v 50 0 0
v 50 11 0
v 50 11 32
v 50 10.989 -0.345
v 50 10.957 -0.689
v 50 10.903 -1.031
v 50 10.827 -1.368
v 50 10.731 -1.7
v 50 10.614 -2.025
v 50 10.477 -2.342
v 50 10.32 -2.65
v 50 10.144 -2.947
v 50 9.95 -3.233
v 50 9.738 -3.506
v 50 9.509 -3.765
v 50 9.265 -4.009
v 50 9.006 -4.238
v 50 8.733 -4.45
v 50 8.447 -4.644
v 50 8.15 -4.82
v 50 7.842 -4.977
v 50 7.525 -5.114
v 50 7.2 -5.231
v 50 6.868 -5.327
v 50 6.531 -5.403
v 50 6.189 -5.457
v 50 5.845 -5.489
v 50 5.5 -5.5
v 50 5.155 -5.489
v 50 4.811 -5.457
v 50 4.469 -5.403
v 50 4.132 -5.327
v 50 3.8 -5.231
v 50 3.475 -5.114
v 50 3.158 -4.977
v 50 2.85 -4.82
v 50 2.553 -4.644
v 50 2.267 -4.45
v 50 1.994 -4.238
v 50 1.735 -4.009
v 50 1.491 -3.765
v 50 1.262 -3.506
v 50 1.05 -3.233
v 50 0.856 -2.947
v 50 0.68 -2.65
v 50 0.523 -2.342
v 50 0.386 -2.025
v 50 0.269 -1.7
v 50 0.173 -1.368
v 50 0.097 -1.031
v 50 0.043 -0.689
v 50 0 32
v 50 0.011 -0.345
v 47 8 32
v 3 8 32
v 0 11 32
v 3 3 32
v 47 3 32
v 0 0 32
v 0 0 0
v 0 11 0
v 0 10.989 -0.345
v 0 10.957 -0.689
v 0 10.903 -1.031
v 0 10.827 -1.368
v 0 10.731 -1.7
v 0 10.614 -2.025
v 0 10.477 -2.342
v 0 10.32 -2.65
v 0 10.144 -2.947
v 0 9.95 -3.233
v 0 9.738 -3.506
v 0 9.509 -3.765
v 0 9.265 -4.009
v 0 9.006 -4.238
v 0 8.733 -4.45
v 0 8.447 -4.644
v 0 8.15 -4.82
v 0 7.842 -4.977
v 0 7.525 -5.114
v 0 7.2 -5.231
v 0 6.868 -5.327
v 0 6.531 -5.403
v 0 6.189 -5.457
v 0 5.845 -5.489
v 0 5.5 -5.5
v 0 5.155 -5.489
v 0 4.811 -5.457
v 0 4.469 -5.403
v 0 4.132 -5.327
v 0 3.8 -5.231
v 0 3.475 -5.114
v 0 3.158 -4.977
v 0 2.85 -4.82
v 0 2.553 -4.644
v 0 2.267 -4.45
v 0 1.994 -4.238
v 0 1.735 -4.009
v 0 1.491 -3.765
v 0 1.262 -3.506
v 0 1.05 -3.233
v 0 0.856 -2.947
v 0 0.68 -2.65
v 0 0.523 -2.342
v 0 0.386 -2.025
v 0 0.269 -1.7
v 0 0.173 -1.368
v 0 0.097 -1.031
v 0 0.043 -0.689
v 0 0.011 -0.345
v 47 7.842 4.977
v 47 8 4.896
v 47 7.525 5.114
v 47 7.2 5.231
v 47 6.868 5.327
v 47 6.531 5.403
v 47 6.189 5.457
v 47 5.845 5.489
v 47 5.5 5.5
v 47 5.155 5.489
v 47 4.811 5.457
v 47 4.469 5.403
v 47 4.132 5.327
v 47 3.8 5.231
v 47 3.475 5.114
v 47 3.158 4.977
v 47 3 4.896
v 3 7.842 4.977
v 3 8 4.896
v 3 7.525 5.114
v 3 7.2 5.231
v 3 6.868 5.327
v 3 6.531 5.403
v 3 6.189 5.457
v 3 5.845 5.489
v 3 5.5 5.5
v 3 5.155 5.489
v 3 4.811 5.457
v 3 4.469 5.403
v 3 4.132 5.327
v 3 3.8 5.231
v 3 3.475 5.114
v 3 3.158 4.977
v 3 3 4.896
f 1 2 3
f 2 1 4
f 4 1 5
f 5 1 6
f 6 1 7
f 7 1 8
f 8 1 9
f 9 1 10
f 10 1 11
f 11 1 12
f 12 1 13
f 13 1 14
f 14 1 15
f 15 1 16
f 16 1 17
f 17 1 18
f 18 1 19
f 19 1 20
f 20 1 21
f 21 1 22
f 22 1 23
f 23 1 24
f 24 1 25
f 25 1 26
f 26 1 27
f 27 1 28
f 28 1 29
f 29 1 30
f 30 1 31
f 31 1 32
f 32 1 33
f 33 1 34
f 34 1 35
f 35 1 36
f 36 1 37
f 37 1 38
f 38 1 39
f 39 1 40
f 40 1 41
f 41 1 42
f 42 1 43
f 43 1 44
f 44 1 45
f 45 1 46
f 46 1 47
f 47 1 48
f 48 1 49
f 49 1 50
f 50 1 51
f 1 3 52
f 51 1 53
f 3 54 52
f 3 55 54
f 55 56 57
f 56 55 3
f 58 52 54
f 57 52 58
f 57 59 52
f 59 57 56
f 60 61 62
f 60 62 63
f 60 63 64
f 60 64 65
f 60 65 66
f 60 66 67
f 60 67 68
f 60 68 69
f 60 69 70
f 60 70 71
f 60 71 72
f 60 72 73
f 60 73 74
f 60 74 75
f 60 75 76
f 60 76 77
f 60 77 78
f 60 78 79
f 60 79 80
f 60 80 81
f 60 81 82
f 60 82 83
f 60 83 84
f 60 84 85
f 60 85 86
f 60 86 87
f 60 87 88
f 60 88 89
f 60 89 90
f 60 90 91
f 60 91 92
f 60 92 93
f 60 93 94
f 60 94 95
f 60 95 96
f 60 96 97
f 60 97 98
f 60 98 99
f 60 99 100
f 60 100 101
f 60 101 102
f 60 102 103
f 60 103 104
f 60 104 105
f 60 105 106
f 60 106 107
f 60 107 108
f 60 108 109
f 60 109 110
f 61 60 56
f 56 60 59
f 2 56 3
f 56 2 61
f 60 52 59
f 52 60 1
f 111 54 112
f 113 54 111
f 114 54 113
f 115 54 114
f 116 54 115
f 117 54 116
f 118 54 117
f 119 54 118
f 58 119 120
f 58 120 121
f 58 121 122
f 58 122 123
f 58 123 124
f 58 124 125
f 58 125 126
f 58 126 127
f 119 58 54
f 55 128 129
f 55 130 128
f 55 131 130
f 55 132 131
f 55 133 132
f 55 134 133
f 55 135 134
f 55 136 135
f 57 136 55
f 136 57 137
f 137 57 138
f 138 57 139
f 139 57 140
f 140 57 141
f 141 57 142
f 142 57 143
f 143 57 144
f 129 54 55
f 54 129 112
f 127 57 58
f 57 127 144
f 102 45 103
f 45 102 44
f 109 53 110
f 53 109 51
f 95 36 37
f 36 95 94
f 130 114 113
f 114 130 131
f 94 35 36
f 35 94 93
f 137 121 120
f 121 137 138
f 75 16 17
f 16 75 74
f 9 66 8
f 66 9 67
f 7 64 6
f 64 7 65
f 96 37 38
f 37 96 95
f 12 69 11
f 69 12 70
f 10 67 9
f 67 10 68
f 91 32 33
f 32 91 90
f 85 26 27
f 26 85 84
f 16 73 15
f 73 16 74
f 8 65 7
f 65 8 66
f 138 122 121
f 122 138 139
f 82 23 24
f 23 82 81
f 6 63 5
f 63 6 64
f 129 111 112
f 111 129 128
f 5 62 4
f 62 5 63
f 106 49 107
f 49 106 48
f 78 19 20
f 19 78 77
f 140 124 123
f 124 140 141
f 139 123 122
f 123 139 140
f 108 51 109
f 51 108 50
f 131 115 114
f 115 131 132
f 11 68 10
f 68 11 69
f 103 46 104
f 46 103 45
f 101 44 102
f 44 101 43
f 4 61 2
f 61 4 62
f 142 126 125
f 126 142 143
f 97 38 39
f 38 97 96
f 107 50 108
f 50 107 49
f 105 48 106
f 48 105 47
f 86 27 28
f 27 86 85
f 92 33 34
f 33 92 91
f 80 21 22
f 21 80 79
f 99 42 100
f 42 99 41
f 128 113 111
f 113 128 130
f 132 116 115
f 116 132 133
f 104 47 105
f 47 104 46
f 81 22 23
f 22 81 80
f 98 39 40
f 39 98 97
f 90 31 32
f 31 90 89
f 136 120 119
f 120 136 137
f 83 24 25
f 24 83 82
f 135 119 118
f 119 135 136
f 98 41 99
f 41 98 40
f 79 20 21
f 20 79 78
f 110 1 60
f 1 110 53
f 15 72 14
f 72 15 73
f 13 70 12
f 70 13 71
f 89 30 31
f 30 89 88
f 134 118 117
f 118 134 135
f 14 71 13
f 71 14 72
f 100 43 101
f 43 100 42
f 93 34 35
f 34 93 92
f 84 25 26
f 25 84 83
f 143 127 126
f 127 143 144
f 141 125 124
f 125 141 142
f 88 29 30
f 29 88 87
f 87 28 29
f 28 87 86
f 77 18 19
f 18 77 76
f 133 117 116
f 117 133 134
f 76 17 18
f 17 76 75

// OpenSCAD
// set smoothness
$fn = 100;

wall_thickness = 3;

cutout_height = 30;
cutout_width = 44;
cutout_thickness = 5;

outer_height = cutout_height + 2;
outer_width = cutout_width + wall_thickness  * 2;
outer_thickness = cutout_thickness + wall_thickness  * 2;

translate([0,outer_thickness / 2,0]) rotate([90,0,90]) cylinder(h = outer_width,  r = outer_thickness / 2);

difference() {
    cube([outer_width, outer_thickness, outer_height]);
    translate([3,3,3])
    cube([cutout_width, cutout_thickness, cutout_height]);
}
